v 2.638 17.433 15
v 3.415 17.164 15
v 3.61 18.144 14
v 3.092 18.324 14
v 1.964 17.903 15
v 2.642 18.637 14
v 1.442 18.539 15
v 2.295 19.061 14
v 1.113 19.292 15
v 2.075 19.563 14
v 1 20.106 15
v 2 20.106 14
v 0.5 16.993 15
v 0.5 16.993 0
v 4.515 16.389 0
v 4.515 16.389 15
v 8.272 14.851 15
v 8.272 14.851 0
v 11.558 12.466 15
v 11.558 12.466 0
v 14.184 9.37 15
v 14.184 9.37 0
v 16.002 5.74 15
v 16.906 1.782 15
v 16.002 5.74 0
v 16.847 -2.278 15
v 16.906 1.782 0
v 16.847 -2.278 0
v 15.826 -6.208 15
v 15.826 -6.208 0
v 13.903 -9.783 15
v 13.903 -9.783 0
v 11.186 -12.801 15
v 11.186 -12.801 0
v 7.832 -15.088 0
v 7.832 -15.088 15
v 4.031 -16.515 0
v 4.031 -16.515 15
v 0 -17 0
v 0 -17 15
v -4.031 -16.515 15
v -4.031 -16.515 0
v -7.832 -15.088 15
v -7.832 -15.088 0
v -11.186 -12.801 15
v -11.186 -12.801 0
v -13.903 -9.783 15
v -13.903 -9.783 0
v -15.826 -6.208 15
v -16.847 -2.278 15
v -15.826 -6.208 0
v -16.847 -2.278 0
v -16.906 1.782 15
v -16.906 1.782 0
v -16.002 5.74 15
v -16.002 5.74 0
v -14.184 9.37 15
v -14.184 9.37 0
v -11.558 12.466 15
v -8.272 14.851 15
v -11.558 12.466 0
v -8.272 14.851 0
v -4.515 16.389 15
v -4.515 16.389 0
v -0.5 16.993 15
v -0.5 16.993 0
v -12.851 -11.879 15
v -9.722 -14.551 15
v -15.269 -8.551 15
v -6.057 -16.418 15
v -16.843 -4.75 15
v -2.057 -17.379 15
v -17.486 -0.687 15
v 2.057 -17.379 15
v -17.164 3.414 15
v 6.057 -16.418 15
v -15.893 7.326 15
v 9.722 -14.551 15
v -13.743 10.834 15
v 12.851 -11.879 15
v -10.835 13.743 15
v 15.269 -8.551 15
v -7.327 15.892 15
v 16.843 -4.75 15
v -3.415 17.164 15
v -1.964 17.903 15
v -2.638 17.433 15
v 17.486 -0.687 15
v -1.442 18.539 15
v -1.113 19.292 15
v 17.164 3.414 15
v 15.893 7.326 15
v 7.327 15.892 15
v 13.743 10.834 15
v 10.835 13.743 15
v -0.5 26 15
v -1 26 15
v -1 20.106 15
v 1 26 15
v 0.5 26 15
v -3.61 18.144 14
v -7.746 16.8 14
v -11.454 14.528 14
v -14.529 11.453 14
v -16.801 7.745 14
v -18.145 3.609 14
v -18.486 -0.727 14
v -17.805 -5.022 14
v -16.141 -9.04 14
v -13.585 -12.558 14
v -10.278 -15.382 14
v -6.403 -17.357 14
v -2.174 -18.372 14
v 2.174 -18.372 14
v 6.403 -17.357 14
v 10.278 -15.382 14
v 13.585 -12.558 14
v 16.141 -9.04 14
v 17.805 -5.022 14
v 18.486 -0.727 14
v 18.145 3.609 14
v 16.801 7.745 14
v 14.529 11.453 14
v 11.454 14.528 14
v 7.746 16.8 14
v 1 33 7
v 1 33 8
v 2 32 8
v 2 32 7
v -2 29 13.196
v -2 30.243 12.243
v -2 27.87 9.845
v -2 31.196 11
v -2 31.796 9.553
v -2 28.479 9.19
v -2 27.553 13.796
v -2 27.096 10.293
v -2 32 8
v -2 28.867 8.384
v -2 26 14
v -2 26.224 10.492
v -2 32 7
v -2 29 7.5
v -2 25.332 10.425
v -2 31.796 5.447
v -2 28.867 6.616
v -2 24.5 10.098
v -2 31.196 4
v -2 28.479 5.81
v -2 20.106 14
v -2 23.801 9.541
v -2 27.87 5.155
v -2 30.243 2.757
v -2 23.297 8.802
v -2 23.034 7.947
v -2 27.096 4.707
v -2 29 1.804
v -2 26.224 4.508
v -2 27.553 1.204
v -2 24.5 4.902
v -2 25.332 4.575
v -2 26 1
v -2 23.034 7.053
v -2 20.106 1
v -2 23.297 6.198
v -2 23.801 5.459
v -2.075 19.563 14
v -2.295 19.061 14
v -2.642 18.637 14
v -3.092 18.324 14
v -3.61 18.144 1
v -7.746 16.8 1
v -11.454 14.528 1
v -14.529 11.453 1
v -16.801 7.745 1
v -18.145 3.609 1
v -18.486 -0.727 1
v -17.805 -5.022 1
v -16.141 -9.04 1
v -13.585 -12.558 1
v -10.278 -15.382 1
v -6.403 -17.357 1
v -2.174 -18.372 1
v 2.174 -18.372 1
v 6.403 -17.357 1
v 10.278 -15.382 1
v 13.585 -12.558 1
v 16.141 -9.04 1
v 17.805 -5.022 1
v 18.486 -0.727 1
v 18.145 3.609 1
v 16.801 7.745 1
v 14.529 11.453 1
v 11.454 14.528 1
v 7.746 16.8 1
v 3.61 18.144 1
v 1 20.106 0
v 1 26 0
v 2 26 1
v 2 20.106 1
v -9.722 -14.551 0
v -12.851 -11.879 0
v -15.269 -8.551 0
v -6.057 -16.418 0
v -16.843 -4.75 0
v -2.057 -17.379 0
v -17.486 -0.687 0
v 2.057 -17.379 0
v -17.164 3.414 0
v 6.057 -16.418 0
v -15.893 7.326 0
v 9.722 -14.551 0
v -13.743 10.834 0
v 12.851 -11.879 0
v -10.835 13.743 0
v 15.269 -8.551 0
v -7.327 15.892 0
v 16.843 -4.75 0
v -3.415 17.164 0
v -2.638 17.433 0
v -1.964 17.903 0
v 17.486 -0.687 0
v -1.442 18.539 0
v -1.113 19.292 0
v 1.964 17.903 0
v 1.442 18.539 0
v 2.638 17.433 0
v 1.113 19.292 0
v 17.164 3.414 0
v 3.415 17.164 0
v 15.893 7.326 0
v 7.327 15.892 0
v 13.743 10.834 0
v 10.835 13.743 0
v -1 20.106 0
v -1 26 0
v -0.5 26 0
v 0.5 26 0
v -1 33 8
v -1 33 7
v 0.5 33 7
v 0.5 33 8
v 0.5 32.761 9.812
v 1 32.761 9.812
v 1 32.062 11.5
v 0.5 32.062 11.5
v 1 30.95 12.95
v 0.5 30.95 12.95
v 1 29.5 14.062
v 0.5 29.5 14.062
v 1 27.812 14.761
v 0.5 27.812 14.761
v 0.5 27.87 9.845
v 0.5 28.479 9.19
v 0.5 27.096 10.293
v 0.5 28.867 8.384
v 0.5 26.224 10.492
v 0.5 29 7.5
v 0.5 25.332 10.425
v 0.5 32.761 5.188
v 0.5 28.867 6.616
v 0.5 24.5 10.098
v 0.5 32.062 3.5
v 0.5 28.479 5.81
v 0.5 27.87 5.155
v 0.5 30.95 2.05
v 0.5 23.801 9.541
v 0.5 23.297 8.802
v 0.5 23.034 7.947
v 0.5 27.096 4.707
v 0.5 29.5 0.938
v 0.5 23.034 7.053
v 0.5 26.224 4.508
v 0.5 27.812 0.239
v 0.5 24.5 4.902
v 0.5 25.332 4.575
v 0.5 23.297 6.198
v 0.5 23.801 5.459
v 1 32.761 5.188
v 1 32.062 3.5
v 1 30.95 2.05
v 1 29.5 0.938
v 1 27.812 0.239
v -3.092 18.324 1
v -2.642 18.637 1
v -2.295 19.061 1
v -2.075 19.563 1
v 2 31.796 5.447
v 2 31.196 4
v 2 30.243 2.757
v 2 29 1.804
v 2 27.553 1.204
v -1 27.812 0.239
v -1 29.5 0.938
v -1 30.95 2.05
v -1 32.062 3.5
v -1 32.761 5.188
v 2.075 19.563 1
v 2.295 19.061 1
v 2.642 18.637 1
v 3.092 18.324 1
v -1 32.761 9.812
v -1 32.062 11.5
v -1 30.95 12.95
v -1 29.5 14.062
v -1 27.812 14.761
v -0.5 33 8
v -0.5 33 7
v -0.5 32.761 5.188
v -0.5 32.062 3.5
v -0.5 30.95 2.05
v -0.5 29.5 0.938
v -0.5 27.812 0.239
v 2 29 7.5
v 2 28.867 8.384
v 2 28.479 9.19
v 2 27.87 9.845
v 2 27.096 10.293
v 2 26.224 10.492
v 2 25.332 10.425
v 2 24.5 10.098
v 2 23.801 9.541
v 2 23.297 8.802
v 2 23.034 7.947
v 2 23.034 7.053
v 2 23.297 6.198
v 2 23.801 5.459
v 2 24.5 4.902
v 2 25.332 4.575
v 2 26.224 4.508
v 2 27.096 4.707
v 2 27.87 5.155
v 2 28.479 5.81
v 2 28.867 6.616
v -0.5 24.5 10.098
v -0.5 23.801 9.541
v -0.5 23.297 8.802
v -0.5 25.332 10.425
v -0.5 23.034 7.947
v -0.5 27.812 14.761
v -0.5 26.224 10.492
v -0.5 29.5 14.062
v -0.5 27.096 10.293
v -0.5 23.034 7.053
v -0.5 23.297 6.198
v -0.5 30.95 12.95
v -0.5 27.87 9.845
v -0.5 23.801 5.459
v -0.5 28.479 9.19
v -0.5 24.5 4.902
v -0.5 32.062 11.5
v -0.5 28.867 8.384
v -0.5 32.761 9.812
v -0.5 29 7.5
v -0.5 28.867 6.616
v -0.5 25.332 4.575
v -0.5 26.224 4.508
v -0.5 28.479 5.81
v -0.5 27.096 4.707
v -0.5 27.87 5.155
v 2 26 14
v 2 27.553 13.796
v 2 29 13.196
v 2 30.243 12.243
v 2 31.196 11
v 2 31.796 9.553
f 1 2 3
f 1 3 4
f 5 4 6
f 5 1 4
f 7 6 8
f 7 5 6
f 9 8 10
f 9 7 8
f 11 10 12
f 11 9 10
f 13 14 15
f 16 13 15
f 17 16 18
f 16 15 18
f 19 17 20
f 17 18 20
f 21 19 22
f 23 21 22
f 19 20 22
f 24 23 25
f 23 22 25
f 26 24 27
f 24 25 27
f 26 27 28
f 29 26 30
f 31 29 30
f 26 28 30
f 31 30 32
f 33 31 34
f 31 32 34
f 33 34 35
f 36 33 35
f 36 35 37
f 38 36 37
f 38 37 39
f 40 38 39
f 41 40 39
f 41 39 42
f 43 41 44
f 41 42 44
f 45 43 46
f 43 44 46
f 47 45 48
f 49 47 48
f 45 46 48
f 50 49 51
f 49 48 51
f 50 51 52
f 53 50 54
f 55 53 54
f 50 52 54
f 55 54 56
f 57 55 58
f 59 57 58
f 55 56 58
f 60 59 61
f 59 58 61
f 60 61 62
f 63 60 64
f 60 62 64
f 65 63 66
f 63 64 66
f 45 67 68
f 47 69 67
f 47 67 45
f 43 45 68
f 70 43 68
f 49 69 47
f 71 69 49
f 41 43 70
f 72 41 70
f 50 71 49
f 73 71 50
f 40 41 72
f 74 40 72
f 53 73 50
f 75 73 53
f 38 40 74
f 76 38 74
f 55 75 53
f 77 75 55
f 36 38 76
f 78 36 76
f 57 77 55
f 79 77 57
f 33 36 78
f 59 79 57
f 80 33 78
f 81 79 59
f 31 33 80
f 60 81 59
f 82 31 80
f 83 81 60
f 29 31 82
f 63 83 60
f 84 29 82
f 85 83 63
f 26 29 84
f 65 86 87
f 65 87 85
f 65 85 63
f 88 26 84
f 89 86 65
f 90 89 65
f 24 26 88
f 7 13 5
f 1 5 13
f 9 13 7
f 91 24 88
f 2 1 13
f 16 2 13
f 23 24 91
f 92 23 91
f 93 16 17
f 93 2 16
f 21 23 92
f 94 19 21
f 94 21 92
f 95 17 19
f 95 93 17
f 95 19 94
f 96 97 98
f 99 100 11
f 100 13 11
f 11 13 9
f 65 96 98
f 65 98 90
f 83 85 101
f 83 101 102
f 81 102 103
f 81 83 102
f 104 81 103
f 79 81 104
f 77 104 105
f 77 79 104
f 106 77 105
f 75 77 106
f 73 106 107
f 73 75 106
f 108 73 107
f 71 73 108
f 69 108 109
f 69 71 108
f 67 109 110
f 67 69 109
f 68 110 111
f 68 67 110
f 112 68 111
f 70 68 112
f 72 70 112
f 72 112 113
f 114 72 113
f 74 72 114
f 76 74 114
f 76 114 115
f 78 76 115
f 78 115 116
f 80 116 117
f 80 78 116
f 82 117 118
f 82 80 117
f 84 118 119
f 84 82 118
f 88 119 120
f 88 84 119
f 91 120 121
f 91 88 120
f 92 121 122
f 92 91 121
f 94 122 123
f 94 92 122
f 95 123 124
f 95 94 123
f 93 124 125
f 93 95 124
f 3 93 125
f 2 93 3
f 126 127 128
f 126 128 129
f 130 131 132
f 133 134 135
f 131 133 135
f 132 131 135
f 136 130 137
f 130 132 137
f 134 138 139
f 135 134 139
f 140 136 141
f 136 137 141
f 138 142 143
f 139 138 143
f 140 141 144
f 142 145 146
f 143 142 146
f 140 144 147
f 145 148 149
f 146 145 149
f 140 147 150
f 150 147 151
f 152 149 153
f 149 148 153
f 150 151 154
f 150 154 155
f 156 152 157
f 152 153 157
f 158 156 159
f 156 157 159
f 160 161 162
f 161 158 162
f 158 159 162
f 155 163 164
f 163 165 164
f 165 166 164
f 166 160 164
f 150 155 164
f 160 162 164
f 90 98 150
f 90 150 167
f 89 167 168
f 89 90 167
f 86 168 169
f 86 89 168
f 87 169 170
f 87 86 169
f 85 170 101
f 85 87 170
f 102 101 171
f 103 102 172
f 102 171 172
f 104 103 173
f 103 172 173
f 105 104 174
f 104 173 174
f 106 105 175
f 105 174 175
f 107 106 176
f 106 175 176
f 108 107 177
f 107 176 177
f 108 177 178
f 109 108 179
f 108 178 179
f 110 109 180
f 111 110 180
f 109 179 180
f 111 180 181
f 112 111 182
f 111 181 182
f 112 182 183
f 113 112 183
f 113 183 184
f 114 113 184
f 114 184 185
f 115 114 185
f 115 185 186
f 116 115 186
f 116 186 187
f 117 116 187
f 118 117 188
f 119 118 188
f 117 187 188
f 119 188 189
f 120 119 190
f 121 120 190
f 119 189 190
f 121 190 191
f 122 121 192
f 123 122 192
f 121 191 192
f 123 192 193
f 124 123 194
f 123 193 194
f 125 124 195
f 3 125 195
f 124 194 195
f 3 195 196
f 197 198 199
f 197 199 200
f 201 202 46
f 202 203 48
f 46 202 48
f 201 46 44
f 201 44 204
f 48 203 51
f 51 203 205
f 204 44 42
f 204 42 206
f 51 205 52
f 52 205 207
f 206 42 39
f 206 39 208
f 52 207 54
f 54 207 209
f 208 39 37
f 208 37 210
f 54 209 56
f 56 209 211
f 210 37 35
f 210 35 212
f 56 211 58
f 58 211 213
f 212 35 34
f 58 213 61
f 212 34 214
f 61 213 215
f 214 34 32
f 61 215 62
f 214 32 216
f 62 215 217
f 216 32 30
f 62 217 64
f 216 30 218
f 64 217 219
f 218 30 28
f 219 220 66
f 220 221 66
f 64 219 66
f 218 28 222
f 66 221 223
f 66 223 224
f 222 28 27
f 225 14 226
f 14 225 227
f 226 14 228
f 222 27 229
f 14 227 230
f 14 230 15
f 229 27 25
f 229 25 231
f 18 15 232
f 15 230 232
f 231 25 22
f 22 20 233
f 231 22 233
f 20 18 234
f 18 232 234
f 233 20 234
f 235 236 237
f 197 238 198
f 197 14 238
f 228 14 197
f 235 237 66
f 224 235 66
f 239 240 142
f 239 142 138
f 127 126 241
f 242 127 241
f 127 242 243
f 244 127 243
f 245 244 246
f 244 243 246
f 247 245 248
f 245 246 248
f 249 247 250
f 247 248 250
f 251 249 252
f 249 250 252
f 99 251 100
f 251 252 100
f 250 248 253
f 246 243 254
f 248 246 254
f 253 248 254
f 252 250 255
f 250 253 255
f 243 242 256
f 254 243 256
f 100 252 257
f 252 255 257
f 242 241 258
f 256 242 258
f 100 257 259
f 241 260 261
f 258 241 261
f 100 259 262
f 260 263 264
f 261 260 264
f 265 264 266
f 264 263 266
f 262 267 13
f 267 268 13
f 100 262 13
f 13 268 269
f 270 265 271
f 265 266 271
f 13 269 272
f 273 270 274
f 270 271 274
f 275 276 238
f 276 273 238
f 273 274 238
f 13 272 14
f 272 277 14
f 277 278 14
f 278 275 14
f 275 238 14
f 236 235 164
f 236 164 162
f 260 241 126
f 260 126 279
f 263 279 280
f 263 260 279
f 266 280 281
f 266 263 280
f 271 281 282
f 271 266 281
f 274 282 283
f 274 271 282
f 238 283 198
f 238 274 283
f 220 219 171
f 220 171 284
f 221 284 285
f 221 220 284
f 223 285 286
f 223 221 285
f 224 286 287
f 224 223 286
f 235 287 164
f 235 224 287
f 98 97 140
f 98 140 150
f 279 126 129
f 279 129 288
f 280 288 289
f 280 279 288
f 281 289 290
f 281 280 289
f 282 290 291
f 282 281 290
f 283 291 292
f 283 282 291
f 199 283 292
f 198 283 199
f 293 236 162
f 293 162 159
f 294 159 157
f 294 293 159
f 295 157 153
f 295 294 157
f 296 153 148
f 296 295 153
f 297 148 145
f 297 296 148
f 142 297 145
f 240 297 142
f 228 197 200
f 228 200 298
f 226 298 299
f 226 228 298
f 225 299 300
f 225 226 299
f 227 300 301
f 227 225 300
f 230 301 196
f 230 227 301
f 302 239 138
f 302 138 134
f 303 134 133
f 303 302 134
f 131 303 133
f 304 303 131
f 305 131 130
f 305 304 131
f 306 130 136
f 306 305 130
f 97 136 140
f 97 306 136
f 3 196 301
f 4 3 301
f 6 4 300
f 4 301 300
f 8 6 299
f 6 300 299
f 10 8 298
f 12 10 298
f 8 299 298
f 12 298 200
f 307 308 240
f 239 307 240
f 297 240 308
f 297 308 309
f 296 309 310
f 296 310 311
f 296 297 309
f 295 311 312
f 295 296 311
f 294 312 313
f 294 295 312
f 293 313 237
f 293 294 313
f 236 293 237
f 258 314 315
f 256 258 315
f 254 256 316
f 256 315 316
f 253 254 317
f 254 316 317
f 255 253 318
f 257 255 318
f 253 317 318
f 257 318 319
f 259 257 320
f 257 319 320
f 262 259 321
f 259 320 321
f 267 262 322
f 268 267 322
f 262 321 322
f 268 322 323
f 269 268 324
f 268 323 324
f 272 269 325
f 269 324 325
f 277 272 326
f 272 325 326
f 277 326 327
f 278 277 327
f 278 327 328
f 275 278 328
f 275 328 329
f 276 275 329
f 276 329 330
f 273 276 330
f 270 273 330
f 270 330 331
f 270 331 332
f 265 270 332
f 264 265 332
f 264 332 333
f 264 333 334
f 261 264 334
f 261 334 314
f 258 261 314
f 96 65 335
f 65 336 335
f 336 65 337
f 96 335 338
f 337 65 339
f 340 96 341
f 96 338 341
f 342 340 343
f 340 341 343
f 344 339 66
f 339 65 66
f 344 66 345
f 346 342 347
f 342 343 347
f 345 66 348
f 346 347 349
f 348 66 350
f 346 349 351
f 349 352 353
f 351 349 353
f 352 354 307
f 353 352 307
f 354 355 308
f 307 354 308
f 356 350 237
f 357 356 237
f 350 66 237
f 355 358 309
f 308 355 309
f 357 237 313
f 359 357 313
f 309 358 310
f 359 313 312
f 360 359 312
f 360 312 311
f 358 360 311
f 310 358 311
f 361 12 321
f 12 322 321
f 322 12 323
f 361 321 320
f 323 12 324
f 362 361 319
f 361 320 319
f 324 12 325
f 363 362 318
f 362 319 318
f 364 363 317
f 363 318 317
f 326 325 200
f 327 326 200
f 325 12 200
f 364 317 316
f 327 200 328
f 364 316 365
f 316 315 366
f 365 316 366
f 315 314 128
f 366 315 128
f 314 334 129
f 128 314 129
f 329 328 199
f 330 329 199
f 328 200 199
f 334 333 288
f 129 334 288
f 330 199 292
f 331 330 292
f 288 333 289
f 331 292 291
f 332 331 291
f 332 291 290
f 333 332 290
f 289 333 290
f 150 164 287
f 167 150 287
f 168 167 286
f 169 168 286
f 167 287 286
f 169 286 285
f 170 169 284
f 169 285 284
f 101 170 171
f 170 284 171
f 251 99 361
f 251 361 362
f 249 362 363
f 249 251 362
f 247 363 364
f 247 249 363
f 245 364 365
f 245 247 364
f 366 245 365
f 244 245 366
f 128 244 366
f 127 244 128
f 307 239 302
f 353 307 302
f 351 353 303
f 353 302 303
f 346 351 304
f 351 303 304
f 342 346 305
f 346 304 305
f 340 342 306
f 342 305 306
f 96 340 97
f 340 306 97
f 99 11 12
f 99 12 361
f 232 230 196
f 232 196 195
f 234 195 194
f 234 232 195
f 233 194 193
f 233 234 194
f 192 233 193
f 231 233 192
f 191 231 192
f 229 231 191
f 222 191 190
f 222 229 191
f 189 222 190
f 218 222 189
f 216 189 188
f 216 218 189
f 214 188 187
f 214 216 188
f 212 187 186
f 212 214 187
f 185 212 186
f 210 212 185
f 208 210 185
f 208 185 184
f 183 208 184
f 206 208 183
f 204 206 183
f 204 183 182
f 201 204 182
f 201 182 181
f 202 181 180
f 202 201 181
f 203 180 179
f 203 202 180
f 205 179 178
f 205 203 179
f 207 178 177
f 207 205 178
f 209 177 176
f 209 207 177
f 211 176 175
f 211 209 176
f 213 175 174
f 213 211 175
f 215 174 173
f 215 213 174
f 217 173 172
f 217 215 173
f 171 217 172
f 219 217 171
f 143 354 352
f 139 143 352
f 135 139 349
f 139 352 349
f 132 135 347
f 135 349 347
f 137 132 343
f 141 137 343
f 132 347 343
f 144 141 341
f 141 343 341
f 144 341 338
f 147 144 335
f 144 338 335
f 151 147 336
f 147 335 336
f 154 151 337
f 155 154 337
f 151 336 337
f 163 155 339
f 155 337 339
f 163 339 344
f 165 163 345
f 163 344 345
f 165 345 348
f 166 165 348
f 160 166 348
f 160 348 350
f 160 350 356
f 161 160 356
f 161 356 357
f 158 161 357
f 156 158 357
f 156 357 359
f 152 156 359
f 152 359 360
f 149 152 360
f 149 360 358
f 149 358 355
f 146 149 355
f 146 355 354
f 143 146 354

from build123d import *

# Parameters (mm, degrees)
F1_DEPTH = 15
F2_R     = 7
F3_R     = 3
F4_DEPTH = 25
F5_SIZE2 = 1
F5_SIZE  = 1


with BuildPart() as f1:
    # F0 (on Top) → F1 (new body)
    with BuildSketch(Plane.XY):
        with BuildLine():
            ThreePointArc((-2, 20.105969), (-2.453959, 18.837208), (-3.609756, 18.144411))
            ThreePointArc((-3.609756, 18.144411), (0, -18.5), (3.609756, 18.144411))
            ThreePointArc((3.609756, 18.144411), (2.453959, 18.837208), (2, 20.105969))
            Line((2, 20.105969), (2, 33))
            Line((2, 33), (0.5, 33))
            Line((0.5, 33), (0.5, 16.992645))
            ThreePointArc((0.5, 16.992645), (0, -17), (-0.5, 16.992645))
            Line((-0.5, 16.992645), (-0.5, 33))
            Line((-0.5, 33), (-2, 33))
            Line((-2, 33), (-2, 20.105969))
        make_face()
    extrude(amount=F1_DEPTH)

    # F2
    f2_edges = [f1.edges().sort_by_distance(p)[0] for p in [
        (1.25, 33, 15),
        (-1.25, 33, 15),
        (1.25, 33, 0),
        (-1.25, 33, 0),
    ]]
    fillet(f2_edges, radius=F2_R)

    # F3 (on face) → F4 (cut)
    with BuildSketch(Plane.YZ.offset(2)):
        with Locations((26, 7.5)):
            Circle(F3_R)
    extrude(amount=-F4_DEPTH, mode=Mode.SUBTRACT)

    # F5
    f5_edges = [f1.edges().sort_by_distance(p)[0] for p in [
        (2, 23.052985, 15),
    ]]
    chamfer(f5_edges, length=F5_SIZE, length2=F5_SIZE2)


solid = f1.part
